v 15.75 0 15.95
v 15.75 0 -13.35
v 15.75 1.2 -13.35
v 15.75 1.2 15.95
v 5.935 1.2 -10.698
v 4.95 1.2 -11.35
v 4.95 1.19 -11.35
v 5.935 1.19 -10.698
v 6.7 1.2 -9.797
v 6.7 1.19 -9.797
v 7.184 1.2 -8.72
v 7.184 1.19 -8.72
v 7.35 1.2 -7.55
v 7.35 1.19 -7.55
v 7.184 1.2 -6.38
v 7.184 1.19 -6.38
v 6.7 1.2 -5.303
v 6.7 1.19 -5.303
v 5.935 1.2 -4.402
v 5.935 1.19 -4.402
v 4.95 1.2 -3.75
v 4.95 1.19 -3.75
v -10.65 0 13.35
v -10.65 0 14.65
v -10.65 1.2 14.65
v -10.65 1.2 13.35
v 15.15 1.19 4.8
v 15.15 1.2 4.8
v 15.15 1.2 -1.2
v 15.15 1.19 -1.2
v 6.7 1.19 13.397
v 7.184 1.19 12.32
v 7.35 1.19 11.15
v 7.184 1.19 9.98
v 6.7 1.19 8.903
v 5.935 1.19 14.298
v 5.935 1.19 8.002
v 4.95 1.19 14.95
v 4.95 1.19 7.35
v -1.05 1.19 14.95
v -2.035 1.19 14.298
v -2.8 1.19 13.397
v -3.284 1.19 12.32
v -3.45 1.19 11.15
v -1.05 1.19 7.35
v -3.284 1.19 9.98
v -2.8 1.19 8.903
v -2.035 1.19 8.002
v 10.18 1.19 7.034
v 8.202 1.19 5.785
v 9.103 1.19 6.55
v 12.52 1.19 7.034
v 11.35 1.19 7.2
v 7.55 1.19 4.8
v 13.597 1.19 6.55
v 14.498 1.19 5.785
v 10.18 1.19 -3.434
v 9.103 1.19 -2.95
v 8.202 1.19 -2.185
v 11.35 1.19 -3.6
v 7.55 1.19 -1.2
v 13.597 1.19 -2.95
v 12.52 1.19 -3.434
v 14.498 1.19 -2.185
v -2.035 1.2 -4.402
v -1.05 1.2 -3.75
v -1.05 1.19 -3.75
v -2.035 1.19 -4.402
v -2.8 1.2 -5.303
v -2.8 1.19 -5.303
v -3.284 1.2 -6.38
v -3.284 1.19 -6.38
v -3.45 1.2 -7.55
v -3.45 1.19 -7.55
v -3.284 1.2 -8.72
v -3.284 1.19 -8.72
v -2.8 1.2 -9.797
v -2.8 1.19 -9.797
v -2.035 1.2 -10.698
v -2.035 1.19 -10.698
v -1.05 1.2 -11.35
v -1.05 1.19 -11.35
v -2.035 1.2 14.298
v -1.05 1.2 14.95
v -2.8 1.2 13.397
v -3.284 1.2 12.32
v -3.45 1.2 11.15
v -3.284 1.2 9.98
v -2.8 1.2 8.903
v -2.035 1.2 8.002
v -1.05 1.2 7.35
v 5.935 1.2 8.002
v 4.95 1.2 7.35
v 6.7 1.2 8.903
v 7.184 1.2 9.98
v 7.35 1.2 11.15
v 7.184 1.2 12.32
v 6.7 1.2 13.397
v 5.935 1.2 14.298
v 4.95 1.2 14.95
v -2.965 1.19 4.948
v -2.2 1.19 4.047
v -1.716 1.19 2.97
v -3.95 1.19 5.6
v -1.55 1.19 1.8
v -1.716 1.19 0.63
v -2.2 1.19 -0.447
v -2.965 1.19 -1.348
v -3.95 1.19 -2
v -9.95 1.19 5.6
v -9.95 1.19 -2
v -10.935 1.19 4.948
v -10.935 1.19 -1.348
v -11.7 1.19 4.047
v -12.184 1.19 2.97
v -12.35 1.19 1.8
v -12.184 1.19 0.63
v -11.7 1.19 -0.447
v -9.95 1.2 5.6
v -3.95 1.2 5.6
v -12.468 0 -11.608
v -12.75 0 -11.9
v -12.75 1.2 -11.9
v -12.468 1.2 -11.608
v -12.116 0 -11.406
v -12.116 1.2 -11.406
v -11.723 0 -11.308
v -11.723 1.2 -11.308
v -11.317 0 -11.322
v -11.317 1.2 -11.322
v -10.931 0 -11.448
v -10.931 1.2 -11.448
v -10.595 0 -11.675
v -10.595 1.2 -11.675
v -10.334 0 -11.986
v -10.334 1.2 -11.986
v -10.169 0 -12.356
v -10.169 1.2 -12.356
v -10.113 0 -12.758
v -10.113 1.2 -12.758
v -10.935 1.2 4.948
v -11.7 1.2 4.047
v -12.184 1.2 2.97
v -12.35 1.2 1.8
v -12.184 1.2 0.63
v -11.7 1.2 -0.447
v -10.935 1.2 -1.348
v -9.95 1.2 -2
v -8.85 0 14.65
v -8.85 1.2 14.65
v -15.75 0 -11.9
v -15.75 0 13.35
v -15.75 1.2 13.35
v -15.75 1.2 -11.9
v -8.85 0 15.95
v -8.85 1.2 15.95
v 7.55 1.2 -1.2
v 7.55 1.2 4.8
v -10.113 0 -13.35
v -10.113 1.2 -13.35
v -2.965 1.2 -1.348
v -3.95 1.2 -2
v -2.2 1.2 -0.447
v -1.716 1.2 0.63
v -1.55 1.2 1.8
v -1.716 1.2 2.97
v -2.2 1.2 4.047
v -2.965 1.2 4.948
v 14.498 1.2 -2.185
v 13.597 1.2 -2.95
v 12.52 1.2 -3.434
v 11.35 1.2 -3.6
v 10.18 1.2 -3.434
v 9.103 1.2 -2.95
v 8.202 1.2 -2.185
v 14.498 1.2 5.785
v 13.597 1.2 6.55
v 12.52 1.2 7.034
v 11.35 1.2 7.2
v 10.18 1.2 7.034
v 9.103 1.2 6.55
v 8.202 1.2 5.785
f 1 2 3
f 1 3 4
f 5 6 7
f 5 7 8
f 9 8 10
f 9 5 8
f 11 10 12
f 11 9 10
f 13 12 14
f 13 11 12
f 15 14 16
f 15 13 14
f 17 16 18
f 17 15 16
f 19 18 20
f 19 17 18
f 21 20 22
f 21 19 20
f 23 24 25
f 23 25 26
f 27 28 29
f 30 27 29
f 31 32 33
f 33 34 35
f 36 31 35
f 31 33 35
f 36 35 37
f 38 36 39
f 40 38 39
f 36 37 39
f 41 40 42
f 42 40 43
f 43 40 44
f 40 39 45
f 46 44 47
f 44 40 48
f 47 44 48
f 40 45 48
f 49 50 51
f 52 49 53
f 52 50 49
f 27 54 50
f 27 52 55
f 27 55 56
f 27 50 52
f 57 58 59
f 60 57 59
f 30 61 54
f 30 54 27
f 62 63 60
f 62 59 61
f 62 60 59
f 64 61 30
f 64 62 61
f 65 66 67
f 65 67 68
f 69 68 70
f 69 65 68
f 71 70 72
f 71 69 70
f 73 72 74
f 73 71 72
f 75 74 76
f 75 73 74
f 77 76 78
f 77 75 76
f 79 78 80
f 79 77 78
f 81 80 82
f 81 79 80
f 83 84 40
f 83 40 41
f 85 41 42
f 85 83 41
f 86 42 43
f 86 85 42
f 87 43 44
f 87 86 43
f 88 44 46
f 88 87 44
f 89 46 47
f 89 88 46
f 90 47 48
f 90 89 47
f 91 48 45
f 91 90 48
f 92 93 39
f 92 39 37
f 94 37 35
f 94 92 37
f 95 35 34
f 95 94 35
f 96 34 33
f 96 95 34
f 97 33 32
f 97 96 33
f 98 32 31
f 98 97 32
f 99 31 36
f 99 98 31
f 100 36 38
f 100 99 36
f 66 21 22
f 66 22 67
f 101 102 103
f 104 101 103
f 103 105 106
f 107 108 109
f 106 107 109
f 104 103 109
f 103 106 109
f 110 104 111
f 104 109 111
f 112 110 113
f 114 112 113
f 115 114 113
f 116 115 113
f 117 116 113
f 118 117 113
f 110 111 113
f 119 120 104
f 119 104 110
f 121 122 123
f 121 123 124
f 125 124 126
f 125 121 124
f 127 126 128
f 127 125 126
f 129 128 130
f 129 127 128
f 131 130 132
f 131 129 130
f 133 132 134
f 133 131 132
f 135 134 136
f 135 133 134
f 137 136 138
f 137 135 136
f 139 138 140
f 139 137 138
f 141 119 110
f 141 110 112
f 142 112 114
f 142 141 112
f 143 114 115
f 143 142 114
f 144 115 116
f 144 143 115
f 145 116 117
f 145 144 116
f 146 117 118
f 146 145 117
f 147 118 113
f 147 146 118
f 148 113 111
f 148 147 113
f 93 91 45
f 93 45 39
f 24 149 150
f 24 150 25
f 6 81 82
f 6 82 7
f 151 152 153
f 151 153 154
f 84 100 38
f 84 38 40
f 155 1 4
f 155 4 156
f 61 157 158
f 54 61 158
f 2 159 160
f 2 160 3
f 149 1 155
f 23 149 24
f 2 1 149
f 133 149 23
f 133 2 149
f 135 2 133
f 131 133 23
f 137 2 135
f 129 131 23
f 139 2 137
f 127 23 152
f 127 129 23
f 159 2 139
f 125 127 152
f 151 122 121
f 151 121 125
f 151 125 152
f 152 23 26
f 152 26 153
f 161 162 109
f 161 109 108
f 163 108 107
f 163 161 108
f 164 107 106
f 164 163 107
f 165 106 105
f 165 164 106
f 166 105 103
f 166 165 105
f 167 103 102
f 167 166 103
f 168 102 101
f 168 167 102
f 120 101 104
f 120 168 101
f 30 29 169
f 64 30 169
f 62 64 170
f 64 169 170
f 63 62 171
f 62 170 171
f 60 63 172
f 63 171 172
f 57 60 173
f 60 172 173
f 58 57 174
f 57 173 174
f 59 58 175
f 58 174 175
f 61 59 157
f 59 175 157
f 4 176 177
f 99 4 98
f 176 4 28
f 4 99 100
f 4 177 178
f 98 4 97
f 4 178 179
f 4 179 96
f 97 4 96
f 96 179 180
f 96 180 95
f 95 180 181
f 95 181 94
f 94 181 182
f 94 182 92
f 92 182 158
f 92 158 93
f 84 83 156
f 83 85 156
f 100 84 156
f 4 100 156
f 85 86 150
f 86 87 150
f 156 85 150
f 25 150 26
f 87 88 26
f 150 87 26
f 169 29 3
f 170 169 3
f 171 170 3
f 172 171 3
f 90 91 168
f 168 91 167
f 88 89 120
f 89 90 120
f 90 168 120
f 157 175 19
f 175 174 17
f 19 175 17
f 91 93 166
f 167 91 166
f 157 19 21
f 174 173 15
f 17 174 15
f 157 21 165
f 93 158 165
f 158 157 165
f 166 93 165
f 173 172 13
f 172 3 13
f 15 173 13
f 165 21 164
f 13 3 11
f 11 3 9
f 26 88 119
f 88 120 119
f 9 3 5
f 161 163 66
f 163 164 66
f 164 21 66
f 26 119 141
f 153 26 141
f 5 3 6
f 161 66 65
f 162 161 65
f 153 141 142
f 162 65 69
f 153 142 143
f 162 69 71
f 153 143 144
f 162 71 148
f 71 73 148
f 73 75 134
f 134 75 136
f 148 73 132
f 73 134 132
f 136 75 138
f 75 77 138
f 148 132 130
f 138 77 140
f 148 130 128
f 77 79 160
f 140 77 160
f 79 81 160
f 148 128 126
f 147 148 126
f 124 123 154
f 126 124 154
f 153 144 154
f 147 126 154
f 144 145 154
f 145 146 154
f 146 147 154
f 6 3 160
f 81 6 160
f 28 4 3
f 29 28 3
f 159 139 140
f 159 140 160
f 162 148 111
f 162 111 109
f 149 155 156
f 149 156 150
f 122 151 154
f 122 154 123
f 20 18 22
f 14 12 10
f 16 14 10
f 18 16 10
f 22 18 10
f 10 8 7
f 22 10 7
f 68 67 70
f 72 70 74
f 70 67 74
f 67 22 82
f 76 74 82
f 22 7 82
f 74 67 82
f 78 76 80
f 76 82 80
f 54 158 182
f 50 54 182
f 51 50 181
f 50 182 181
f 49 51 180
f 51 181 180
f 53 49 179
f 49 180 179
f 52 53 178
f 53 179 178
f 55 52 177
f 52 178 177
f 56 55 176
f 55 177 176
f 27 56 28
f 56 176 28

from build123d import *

# Parameters (mm, degrees)
BOSS_EXTRU_1_DEPTH      = 1.2
ENL_V_START             = -1.2
ENL_V_MAT_EXTRU_1_DEPTH = 1.2
ENL_V_MAT_EXTRU_2_DEPTH = 0.01


with BuildPart() as part:
    # Esquisse1 → Boss.-Extru.1 (new body)
    with BuildSketch(Plane(origin=(0, 0, 0), x_dir=(1, 0, 0), z_dir=(0, 1, 0))):
        with BuildLine():
            Line((-15.75, 11.9), (-12.75, 11.9))
            ThreePointArc((-12.75, 11.9), (-10.842060454, 11.495351769), (-10.238526329, 13.35))
            Line((-10.238526329, 13.35), (15.75, 13.35))
            Line((15.75, 13.35), (15.75, -15.95))
            Line((15.75, -15.95), (-8.85, -15.95))
            Line((-8.85, -15.95), (-8.85, -14.65))
            Line((-8.85, -14.65), (-10.65, -14.65))
            Line((-10.65, -14.65), (-10.65, -13.35))
            Line((-10.65, -13.35), (-15.75, -13.35))
            Line((-15.75, -13.35), (-15.75, 11.9))
        make_face()
    extrude(amount=BOSS_EXTRU_1_DEPTH)

    # Esquisse3 → Enlèv. mat.-Extru.1 (cut)
    with BuildSketch(Plane(origin=(0, 1.2, 0), x_dir=(1, 0, 0), z_dir=(0, 1, 0)).offset(ENL_V_START)):
        with BuildLine():
            Line((-10.112997726, 12.758125458), (-10.112997726, 13.35))
            Line((-10.112997726, 13.35), (-10.238526329, 13.35))
            ThreePointArc((-10.238526329, 13.35), (-10.144725054, 13.060645252), (-10.112997726, 12.758125458))
        make_face()
    extrude(amount=ENL_V_MAT_EXTRU_1_DEPTH, mode=Mode.SUBTRACT)

    # Esquisse4 → Enlèv. mat.-Extru.2 (cut)
    with BuildSketch(Plane(origin=(0, 1.2, 0), x_dir=(1, 0, 0), z_dir=(0, 1, 0))):
        with BuildLine():
            Line((-1.05, 11.35), (4.95, 11.35))
            ThreePointArc((4.95, 11.35), (7.35, 7.55), (4.95, 3.75))
            Line((4.95, 3.75), (-1.05, 3.75))
            ThreePointArc((-1.05, 3.75), (-3.45, 7.55), (-1.05, 11.35))
        make_face()
        with BuildLine():
            Line((-1.05, -7.35), (4.95, -7.35))
            ThreePointArc((4.95, -7.35), (7.35, -11.15), (4.95, -14.95))
            Line((4.95, -14.95), (-1.05, -14.95))
            ThreePointArc((-1.05, -14.95), (-3.45, -11.15), (-1.05, -7.35))
        make_face()
        with BuildLine():
            Line((-9.95, 2), (-3.95, 2))
            ThreePointArc((-3.95, 2), (-1.55, -1.8), (-3.95, -5.6))
            Line((-3.95, -5.6), (-9.95, -5.6))
            ThreePointArc((-9.95, -5.6), (-12.35, -1.8), (-9.95, 2))
        make_face()
        with BuildLine():
            Line((7.55, 1.2), (7.55, -4.8))
            ThreePointArc((7.55, -4.8), (11.35, -7.2), (15.15, -4.8))
            Line((15.15, -4.8), (15.15, 1.2))
            ThreePointArc((15.15, 1.2), (11.35, 3.6), (7.55, 1.2))
        make_face()
    extrude(amount=-ENL_V_MAT_EXTRU_2_DEPTH, mode=Mode.SUBTRACT)


solid = part.part
